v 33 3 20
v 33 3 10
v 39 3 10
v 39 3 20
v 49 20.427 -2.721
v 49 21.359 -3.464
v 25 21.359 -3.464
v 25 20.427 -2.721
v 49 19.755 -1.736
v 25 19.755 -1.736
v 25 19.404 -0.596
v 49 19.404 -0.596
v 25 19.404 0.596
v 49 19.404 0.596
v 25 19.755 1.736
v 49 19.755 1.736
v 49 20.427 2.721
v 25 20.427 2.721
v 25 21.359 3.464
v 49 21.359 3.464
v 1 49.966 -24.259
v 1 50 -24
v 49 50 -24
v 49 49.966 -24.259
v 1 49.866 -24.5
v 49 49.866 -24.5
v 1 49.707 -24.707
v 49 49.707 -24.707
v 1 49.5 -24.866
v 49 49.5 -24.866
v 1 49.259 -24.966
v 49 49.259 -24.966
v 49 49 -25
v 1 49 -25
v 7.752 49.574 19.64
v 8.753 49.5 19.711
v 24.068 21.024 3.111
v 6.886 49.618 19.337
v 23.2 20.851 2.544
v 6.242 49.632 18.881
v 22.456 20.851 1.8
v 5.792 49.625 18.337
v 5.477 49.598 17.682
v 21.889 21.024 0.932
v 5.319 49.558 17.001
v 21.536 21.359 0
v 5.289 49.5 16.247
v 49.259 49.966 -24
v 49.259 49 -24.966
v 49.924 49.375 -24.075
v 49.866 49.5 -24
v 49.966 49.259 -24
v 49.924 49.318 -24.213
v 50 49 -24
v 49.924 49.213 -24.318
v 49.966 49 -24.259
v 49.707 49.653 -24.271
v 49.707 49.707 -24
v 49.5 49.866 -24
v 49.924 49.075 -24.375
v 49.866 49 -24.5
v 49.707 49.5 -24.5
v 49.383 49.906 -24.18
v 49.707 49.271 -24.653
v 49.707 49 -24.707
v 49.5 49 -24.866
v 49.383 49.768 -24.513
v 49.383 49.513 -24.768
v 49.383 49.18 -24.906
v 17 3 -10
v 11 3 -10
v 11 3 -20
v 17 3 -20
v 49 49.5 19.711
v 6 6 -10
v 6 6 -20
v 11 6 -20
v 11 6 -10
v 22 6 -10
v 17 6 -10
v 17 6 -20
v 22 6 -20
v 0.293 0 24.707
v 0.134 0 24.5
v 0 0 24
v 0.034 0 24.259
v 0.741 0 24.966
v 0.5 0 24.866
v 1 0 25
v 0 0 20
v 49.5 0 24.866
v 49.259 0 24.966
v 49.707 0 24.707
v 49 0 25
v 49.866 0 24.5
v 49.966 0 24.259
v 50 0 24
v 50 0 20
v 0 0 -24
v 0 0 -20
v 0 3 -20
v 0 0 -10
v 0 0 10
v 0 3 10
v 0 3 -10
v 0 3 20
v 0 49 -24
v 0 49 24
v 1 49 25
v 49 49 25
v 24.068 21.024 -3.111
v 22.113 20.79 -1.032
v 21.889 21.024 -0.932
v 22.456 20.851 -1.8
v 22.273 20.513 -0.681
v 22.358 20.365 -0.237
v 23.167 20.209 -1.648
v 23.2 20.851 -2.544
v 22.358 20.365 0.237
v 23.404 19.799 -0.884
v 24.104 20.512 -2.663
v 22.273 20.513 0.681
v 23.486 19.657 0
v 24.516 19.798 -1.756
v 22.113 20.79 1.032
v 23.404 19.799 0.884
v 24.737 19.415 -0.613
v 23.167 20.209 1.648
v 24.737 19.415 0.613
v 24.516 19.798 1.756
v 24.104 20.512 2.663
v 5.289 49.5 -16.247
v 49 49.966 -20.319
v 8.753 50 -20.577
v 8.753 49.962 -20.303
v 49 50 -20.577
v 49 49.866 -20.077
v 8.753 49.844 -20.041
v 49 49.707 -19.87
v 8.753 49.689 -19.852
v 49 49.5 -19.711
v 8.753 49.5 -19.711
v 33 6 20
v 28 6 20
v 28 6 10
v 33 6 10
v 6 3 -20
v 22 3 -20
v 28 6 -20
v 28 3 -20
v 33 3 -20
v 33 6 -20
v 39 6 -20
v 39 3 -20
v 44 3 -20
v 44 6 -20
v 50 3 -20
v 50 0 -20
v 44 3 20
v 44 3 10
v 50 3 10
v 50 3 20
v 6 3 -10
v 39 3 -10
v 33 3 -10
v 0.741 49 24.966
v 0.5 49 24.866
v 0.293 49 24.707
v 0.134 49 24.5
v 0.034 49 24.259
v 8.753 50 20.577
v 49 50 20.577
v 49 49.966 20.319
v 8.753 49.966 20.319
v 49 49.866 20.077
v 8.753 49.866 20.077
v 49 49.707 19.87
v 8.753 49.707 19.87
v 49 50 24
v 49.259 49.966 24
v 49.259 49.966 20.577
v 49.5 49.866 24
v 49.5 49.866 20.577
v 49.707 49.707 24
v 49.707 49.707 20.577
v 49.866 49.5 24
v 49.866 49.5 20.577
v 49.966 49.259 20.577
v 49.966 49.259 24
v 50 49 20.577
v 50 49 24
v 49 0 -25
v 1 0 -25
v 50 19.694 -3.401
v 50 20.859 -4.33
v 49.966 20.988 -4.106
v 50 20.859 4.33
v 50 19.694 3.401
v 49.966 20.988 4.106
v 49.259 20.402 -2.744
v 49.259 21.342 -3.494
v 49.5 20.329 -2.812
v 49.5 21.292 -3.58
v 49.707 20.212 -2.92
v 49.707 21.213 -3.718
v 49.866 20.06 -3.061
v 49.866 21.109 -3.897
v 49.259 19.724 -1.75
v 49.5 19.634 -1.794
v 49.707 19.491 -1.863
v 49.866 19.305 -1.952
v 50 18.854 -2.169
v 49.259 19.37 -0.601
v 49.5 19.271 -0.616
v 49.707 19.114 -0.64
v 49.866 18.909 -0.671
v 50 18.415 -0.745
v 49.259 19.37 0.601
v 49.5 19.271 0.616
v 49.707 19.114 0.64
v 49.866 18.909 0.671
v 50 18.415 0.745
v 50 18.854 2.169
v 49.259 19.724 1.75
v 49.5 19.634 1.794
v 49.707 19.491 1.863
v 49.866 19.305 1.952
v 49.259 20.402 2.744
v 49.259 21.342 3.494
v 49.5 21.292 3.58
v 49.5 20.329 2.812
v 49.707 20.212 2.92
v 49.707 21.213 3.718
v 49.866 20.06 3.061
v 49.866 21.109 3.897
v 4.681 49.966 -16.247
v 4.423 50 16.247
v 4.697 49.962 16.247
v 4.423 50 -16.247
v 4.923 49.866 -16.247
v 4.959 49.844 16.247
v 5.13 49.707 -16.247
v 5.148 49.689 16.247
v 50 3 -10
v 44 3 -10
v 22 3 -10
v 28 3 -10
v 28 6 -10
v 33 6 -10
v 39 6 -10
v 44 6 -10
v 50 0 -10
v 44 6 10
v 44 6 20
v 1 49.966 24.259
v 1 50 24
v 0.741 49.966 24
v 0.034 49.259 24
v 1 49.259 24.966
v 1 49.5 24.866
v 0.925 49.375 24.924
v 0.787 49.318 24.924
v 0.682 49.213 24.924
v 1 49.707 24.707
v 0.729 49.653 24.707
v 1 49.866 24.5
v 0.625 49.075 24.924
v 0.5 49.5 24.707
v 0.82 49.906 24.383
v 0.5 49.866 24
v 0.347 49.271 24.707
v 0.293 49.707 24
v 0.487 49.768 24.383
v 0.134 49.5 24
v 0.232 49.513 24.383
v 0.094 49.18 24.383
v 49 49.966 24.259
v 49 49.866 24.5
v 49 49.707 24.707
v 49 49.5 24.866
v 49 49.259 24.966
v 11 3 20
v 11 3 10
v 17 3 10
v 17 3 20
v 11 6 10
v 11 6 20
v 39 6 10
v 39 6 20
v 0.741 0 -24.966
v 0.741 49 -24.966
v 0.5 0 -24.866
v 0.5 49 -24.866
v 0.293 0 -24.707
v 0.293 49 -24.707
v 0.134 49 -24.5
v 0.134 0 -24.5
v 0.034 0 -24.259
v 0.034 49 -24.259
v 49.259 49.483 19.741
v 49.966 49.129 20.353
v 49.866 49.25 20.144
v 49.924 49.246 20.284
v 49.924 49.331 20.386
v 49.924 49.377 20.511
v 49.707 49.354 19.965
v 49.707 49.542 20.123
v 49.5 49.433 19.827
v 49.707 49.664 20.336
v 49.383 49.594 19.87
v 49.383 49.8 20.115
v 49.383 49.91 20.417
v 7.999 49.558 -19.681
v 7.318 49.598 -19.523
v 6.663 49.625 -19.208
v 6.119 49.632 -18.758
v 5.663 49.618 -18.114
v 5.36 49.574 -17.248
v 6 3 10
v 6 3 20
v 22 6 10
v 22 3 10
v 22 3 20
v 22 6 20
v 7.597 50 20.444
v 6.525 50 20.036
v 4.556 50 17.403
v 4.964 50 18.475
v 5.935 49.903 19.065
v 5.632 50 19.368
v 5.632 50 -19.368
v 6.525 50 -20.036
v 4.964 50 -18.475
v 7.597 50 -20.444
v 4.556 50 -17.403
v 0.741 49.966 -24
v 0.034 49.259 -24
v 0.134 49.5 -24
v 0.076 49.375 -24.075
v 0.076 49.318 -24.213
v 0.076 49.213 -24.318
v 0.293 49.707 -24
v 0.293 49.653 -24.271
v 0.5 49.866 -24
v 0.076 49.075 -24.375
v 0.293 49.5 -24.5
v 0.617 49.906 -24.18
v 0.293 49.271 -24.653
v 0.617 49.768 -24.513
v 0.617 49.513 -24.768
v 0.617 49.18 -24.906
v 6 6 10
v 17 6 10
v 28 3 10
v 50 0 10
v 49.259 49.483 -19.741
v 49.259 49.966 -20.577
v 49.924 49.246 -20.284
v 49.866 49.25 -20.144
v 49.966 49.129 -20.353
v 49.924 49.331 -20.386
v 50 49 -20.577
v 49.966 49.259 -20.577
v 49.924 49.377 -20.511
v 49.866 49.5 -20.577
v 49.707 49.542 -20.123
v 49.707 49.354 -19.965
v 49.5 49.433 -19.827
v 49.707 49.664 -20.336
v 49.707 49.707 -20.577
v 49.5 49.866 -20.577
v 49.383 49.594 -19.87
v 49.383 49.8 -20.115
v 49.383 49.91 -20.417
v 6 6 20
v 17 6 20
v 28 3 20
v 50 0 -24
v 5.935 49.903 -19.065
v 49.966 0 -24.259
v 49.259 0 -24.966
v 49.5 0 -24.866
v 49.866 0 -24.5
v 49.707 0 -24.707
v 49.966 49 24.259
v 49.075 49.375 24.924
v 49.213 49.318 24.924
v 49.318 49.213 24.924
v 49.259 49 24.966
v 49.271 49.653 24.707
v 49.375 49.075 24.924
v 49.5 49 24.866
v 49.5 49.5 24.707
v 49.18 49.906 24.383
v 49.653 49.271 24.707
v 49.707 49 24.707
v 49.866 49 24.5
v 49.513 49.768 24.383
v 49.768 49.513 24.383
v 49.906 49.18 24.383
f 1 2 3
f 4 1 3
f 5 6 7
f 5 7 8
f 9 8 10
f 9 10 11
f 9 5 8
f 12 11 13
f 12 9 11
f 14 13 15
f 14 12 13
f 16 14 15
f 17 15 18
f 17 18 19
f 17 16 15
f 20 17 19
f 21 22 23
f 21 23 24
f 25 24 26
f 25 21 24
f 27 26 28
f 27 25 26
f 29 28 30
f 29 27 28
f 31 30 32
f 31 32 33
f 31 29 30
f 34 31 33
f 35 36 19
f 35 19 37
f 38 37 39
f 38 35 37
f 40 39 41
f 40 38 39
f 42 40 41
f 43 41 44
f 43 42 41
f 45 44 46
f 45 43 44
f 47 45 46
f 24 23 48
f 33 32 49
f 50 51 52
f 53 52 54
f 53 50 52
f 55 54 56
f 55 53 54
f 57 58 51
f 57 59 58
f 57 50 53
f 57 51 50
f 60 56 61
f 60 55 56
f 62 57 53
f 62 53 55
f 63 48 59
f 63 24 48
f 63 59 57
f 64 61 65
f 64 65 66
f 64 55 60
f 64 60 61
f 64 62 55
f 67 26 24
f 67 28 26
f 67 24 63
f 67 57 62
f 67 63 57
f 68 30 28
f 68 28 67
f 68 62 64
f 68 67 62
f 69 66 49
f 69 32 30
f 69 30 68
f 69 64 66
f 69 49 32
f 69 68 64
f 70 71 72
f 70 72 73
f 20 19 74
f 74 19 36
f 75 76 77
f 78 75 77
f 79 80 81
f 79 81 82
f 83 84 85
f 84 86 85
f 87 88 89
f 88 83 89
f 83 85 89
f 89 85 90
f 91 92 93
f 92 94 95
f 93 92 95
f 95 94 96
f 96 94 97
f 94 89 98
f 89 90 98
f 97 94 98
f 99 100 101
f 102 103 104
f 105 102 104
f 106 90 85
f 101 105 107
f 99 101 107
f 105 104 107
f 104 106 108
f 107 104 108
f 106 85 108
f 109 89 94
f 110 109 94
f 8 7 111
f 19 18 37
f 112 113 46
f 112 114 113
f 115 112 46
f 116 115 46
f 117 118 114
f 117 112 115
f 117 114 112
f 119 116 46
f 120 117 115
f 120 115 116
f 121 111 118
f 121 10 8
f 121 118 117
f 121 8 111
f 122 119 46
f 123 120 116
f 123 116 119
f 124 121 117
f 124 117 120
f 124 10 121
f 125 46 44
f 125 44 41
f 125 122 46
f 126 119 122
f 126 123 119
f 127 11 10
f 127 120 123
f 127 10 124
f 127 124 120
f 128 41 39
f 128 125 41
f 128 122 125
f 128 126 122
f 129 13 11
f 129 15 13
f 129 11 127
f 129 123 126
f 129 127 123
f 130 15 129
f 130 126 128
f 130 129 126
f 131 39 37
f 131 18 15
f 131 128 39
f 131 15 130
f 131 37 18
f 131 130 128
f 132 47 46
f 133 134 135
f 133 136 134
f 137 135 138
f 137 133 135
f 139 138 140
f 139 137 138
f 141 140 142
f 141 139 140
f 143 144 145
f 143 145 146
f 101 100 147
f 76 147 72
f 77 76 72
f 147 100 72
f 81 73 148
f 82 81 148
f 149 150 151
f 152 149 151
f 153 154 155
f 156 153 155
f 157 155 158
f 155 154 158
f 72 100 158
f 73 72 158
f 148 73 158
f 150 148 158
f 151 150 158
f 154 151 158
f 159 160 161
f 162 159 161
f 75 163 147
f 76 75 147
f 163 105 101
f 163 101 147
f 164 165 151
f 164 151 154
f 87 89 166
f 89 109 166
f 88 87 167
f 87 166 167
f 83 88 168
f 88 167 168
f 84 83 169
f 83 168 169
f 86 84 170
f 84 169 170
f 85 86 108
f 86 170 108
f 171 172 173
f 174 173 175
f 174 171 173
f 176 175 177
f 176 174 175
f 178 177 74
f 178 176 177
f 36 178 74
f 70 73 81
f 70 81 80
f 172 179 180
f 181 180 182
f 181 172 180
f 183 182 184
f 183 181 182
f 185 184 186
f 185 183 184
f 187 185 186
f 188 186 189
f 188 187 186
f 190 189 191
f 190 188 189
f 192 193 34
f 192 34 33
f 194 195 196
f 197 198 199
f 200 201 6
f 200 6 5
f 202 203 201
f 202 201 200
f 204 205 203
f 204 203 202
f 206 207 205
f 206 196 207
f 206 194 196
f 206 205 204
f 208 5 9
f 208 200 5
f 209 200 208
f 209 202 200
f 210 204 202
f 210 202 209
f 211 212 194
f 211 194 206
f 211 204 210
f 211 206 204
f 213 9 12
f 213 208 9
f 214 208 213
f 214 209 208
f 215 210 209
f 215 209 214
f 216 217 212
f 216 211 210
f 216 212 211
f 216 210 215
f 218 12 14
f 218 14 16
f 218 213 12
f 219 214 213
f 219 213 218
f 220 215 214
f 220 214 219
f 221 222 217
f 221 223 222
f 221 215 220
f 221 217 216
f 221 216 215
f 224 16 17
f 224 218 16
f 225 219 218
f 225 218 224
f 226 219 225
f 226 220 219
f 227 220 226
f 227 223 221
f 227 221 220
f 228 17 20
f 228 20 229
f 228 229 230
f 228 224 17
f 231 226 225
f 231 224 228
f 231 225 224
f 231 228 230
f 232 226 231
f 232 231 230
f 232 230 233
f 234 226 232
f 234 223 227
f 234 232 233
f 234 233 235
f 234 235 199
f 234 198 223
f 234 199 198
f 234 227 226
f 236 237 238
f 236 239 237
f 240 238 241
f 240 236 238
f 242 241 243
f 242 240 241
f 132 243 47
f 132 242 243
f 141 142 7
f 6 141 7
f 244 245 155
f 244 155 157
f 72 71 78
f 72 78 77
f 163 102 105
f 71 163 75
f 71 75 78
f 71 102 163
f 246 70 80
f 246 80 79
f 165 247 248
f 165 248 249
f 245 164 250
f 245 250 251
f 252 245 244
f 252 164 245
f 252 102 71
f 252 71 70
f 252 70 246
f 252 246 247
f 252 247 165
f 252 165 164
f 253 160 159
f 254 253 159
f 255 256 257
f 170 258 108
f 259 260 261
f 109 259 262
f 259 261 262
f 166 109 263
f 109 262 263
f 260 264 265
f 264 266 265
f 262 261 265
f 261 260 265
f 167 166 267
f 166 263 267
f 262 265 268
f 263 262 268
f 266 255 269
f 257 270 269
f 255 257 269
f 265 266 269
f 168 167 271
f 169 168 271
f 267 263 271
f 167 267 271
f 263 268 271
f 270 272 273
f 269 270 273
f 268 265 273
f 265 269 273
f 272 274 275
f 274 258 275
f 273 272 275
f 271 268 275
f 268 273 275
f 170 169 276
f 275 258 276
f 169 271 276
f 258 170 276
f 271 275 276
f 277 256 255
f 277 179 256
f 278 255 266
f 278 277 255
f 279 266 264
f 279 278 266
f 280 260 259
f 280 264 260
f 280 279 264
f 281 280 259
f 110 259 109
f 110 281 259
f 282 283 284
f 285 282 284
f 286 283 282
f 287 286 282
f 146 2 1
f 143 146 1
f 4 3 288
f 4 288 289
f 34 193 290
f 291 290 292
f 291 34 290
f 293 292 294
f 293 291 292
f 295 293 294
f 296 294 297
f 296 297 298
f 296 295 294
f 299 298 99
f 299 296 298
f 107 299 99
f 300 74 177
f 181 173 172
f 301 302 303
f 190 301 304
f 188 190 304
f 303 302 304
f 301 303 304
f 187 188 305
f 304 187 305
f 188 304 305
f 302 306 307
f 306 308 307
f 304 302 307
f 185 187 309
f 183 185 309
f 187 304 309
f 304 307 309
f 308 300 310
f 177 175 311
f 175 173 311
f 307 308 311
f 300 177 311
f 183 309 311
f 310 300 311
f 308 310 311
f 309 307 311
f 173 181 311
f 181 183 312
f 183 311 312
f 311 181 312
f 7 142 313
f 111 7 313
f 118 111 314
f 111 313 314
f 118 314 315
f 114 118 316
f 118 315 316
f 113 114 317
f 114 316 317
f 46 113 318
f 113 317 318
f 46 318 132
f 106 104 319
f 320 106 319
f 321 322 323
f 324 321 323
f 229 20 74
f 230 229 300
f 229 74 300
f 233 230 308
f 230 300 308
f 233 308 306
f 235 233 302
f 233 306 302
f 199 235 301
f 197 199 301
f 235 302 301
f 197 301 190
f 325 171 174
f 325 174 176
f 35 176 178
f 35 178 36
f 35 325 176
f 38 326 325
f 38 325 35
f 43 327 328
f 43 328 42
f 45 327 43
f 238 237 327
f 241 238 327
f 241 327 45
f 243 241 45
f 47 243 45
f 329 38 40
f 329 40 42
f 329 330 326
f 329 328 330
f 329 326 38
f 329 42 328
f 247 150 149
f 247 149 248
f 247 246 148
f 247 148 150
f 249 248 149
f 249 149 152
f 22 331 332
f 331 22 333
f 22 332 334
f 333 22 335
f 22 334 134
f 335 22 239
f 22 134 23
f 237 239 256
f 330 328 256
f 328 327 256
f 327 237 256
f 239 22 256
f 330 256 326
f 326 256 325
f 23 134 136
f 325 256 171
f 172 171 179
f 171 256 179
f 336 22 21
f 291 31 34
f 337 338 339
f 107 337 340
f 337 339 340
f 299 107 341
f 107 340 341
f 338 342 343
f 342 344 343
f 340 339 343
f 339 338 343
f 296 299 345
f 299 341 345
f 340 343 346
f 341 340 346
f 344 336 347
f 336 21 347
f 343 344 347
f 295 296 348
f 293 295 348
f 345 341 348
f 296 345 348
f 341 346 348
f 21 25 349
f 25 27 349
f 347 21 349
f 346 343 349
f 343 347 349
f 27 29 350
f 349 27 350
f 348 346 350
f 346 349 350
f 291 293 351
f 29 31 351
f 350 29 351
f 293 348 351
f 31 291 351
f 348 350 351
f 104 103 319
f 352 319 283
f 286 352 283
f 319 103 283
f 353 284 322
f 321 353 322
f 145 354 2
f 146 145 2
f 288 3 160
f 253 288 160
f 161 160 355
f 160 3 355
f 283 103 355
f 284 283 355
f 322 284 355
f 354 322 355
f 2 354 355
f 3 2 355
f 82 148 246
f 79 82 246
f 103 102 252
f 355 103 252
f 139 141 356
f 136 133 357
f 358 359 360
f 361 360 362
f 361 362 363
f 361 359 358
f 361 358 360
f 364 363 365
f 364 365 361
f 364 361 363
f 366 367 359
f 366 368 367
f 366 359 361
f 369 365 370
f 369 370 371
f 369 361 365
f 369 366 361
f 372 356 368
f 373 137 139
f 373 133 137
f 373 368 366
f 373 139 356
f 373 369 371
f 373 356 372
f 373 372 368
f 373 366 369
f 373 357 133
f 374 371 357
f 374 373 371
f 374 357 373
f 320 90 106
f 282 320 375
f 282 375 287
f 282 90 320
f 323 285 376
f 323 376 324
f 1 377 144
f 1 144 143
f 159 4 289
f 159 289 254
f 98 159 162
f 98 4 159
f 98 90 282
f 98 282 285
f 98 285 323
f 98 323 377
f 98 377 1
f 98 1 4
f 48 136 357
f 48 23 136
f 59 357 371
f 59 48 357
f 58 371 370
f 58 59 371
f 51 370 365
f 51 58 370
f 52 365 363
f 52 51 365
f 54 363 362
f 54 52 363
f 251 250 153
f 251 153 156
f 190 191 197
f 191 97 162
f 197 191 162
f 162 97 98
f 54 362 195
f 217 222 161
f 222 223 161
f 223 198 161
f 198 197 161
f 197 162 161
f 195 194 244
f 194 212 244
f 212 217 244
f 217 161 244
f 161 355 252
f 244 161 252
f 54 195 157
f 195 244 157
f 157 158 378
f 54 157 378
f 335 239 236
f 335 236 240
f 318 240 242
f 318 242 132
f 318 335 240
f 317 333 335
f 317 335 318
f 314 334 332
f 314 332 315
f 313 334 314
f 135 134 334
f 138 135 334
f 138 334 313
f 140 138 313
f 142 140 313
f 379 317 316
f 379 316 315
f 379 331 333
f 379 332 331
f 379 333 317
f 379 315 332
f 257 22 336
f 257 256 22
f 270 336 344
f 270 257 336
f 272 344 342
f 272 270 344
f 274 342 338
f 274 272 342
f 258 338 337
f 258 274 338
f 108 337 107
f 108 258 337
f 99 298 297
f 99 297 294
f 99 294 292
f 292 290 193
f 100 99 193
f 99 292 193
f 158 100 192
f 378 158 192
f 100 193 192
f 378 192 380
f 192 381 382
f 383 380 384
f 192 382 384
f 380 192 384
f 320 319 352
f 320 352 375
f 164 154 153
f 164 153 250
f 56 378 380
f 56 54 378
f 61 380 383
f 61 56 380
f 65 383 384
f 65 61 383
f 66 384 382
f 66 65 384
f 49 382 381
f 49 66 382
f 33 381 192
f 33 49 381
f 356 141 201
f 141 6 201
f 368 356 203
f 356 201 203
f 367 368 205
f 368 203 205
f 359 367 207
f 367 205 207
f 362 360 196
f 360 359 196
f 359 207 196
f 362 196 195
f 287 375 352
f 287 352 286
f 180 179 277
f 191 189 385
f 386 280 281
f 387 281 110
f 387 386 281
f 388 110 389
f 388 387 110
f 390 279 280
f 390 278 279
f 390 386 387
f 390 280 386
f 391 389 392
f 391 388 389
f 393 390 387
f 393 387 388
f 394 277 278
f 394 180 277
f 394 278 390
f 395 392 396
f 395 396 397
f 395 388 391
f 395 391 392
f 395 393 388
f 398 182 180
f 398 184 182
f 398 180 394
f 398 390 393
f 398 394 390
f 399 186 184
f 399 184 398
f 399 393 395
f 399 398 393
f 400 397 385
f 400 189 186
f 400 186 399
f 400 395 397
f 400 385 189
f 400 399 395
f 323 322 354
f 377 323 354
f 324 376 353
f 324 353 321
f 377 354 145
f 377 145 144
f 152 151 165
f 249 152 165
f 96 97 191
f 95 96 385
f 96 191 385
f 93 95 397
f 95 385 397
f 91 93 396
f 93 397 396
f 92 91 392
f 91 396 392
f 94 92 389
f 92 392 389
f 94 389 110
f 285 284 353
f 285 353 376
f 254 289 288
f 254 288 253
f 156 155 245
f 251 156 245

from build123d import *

# Parameters (mm, degrees)
SKETCH1_W                = 50
SKETCH1_H                = 50
BOSS_EXTRUDE1_DEPTH      = 50
CUT_EXTRUDE1_DEPTH       = 50
BOSS_EXTRUDE2_DEPTH      = 25
BOSS_EXTRUDE2_DEPTH_BACK = 25
FILLET1_R                = 4
SKETCH4_W                = 50
SKETCH4_H                = 10
CUT_EXTRUDE3_DEPTH       = 3
SKETCH5_W                = 5
SKETCH5_H                = 10
CUT_EXTRUDE4_DEPTH       = 3
LPATTERN1_COUNT          = 4
LPATTERN1_PITCH          = 11
MIRROR1_COPY_1_SKETCH_W  = 5
MIRROR1_COPY_1_SKETCH_H  = 10
MIRROR1_COPY_1_DEPTH     = 3
MIRROR1_COPY_2_SKETCH_W  = 5
MIRROR1_COPY_2_SKETCH_H  = 10
MIRROR1_COPY_2_DEPTH     = 3
MIRROR1_COPY_3_SKETCH_W  = 5
MIRROR1_COPY_3_SKETCH_H  = 10
MIRROR1_COPY_3_DEPTH     = 3
FILLET2_R                = 1


with BuildPart() as part:
    # Sketch1 → Boss-Extrude1 (new body)
    with BuildSketch(Plane(origin=(0, 0, 0), x_dir=(1, 0, 0), z_dir=(0, 1, 0))):
        with Locations((25, 0)):
            Rectangle(SKETCH1_W, SKETCH1_H)
    extrude(amount=BOSS_EXTRUDE1_DEPTH)

    # Sketch2 → Cut-Extrude1 (cut)
    with BuildSketch(Plane(origin=(0, 0, 0), x_dir=(0, 0, -1), z_dir=(1, 0, 0))):
        Polygon((20, 50), (0, 15.358983849), (-20, 50), align=None)
    extrude(amount=CUT_EXTRUDE1_DEPTH, mode=Mode.SUBTRACT)

    # Sketch3 → Boss-Extrude2 (add, two sides: drawn at the far end of the back side and taken through both)
    with BuildSketch(Plane.XY.offset(-BOSS_EXTRUDE2_DEPTH_BACK)):
        Polygon((0, 50), (5, 50), (33.867513459, 0), (0, 0), align=None)
    extrude(amount=BOSS_EXTRUDE2_DEPTH + BOSS_EXTRUDE2_DEPTH_BACK)

    # Fillet1
    fillet1_edges = [part.edges().sort_by_distance(p)[0] for p in [
        (15, 32.679491924, -10),
        (15, 32.679491924, 10),
        (37.5, 15.358983849, 0),
    ]]
    fillet(fillet1_edges, radius=FILLET1_R)

    # Sketch4 → Cut-Extrude3 (cut)
    with BuildSketch(Plane(origin=(0, 0, 0), x_dir=(1, 0, 0), z_dir=(0, 1, 0))):
        with Locations((25, -15)):
            Rectangle(SKETCH4_W, SKETCH4_H)
    cut_extrude3 = extrude(amount=CUT_EXTRUDE3_DEPTH, mode=Mode.SUBTRACT)

    # Sketch5 → Cut-Extrude4 (cut)
    with BuildSketch(Plane.XZ.offset(-3)):
        with Locations((8.5, 15)):
            Rectangle(SKETCH5_W, SKETCH5_H)
    cut_extrude4 = extrude(amount=-CUT_EXTRUDE4_DEPTH, mode=Mode.SUBTRACT)

    # LPattern1: Cut-Extrude4 ×4
    with Locations(*[(i * LPATTERN1_PITCH, 0, 0) for i in range(1, LPATTERN1_COUNT)]):
        add(cut_extrude4, mode=Mode.SUBTRACT)

    # Mirror1: Cut-Extrude3, Cut-Extrude4 across plane
    add(cut_extrude3.mirror(Plane.XY), mode=Mode.SUBTRACT)
    add(cut_extrude4.mirror(Plane.XY), mode=Mode.SUBTRACT)

    # Mirror1 copy 1 sketch → Mirror1 copy 1 (cut)
    with BuildSketch(Plane(origin=(11, 3, 0), x_dir=(1, 0, 0), z_dir=(0, -1, 0))):
        with Locations((8.5, -15)):
            Rectangle(MIRROR1_COPY_1_SKETCH_W, MIRROR1_COPY_1_SKETCH_H)
    extrude(amount=-MIRROR1_COPY_1_DEPTH, mode=Mode.SUBTRACT)

    # Mirror1 copy 2 sketch → Mirror1 copy 2 (cut)
    with BuildSketch(Plane(origin=(22, 3, 0), x_dir=(1, 0, 0), z_dir=(0, -1, 0))):
        with Locations((8.5, -15)):
            Rectangle(MIRROR1_COPY_2_SKETCH_W, MIRROR1_COPY_2_SKETCH_H)
    extrude(amount=-MIRROR1_COPY_2_DEPTH, mode=Mode.SUBTRACT)

    # Mirror1 copy 3 sketch → Mirror1 copy 3 (cut)
    with BuildSketch(Plane(origin=(33, 3, 0), x_dir=(1, 0, 0), z_dir=(0, -1, 0))):
        with Locations((8.5, -15)):
            Rectangle(MIRROR1_COPY_3_SKETCH_W, MIRROR1_COPY_3_SKETCH_H)
    extrude(amount=-MIRROR1_COPY_3_DEPTH, mode=Mode.SUBTRACT)

    # Fillet2
    fillet2_edges = [part.edges().sort_by_distance(p)[0] for p in [
        (50, 35.679491924, -11.732050808),
        (50, 19.358983849, 0),
        (50, 50, -22.5),
        (29.232050808, 50, -20),
        (5.967318437, 50, -19.032681563),
        (5, 50, 0),
        (5.967318437, 50, 19.032681563),
        (29.232050808, 50, 20),
        (50, 50, 22.5),
        (25, 50, 25),
        (0, 50, 0),
        (25, 50, -25),
        (0, 25, -25),
        (0, 25, 25),
        (50, 25, -25),
        (50, 35.679491924, 11.732050808),
        (50, 25, 25),
    ]]
    fillet(fillet2_edges, radius=FILLET2_R)


solid = part.part
